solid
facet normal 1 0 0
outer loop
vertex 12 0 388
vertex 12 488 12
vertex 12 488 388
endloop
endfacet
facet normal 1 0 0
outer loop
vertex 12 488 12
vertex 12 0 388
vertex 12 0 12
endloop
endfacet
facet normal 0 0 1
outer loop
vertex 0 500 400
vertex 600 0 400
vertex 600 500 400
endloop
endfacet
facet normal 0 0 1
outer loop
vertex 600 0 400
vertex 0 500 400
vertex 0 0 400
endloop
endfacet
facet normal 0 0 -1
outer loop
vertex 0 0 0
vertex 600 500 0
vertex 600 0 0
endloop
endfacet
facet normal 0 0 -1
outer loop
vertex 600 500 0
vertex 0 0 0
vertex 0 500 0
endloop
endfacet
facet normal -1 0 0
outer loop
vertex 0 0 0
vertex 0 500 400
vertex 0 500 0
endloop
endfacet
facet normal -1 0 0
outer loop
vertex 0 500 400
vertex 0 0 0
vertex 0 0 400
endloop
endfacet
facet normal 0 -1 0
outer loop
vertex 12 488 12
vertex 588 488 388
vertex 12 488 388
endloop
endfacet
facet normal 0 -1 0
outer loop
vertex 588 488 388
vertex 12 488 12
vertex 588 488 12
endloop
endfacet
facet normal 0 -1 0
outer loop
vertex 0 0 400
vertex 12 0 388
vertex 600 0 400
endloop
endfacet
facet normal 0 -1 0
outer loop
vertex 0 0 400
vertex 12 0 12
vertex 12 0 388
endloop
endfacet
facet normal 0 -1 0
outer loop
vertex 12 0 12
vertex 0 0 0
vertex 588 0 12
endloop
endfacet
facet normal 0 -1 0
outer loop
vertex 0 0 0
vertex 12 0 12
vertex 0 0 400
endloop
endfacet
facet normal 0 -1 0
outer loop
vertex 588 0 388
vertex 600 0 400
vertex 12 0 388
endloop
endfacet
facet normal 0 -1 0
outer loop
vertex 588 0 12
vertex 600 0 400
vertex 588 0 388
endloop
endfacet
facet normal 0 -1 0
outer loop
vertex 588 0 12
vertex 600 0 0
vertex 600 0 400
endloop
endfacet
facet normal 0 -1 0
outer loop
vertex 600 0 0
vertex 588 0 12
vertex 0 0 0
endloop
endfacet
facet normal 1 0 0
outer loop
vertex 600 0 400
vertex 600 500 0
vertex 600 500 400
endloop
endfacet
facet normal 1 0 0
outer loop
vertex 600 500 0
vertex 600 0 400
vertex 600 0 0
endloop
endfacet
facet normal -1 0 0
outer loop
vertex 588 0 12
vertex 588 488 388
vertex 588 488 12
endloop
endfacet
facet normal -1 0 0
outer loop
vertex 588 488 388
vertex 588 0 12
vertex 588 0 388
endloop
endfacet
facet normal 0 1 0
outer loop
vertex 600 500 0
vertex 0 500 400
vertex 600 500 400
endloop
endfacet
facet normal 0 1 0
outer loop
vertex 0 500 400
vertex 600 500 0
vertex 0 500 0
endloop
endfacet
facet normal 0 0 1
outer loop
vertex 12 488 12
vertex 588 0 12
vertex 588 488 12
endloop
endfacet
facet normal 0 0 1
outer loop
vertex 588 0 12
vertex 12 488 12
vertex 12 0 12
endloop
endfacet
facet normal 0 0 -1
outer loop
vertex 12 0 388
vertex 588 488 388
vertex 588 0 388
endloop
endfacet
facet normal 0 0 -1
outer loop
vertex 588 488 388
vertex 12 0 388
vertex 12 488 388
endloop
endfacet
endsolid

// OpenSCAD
/*

    Storage Unit
    
    By Anton Augustsson


*/



module storageUnit (
    thickness,
    length,
    width,
    height,
    x,y,z,
    yRotate
    ){
/*
    ---------- Local varibles ---------- 
*/


/*
    ---------- Code ---------- 
*/

translate([
    x,
    y,
    z]) 
union () {

// Left
color("Wheat")
translate([
    0,
    0,
    0]) 
cube(size = [
    thickness,
    length-thickness,
    height]);

// Right
color("Wheat")
translate([
    width-thickness,
    0,
    0]) 
cube(size = [
    thickness,
    length-thickness,
    height]);
    
// Back
color("Wheat")
translate([
    0,
    length-thickness,
    0]) 
cube(size = [
    width,
    thickness,
    height]);

// Bottom 
color("Wheat")
translate([
    thickness,
    0,
    0]) 
cube(size = [
    width-thickness*2,
    length-thickness,
    thickness]);

// Top
color("BurlyWood")
translate([
    thickness,
    0,
    height-thickness]) 
cube(size = [
    width-thickness*2,
    length-thickness,
    thickness]);    

}

}
    
/*
    ---------- Example ---------- 
*/


thickness= 12;

length = 500;
width  = 600;
height = 400;


x=0;
y=0;
z=0;
yRotate=0;

storageUnit (
    thickness,
    length,
    width,
    height,
    x,y,z,
    yRotate
    );
